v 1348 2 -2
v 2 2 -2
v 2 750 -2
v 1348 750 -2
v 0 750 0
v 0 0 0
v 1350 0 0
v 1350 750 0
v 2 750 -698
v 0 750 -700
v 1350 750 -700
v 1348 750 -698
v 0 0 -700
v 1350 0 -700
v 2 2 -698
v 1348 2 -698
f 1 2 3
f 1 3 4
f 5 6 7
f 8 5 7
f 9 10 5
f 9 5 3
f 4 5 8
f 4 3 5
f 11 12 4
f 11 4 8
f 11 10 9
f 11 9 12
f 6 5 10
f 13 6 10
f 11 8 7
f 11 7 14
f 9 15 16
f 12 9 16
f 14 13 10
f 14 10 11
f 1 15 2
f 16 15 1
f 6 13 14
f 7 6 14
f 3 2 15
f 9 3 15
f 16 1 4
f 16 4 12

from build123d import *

# Parameters (mm, degrees)
MASTER_FOOTPRINT_W    = 1350
MASTER_FOOTPRINT_H    = 700
BATH_BASE_PLATE_DEPTH = 750
BATH_SHELL_2MM_T      = -2


with BuildPart() as part:
    # MASTER_FOOTPRINT → BATH_BASE_PLATE (new body)
    with BuildSketch(Plane(origin=(0, 0, 0), x_dir=(1, 0, 0), z_dir=(0, 1, 0))):
        with Locations((675, 350)):
            Rectangle(MASTER_FOOTPRINT_W, MASTER_FOOTPRINT_H)
    extrude(amount=BATH_BASE_PLATE_DEPTH)

    # BATH_SHELL_2MM
    bath_shell_2mm_openings = [part.faces().sort_by_distance(p)[0] for p in [
        (675, 750, -350),
    ]]
    offset(amount=BATH_SHELL_2MM_T, openings=bath_shell_2mm_openings, kind=Kind.INTERSECTION)


solid = part.part
